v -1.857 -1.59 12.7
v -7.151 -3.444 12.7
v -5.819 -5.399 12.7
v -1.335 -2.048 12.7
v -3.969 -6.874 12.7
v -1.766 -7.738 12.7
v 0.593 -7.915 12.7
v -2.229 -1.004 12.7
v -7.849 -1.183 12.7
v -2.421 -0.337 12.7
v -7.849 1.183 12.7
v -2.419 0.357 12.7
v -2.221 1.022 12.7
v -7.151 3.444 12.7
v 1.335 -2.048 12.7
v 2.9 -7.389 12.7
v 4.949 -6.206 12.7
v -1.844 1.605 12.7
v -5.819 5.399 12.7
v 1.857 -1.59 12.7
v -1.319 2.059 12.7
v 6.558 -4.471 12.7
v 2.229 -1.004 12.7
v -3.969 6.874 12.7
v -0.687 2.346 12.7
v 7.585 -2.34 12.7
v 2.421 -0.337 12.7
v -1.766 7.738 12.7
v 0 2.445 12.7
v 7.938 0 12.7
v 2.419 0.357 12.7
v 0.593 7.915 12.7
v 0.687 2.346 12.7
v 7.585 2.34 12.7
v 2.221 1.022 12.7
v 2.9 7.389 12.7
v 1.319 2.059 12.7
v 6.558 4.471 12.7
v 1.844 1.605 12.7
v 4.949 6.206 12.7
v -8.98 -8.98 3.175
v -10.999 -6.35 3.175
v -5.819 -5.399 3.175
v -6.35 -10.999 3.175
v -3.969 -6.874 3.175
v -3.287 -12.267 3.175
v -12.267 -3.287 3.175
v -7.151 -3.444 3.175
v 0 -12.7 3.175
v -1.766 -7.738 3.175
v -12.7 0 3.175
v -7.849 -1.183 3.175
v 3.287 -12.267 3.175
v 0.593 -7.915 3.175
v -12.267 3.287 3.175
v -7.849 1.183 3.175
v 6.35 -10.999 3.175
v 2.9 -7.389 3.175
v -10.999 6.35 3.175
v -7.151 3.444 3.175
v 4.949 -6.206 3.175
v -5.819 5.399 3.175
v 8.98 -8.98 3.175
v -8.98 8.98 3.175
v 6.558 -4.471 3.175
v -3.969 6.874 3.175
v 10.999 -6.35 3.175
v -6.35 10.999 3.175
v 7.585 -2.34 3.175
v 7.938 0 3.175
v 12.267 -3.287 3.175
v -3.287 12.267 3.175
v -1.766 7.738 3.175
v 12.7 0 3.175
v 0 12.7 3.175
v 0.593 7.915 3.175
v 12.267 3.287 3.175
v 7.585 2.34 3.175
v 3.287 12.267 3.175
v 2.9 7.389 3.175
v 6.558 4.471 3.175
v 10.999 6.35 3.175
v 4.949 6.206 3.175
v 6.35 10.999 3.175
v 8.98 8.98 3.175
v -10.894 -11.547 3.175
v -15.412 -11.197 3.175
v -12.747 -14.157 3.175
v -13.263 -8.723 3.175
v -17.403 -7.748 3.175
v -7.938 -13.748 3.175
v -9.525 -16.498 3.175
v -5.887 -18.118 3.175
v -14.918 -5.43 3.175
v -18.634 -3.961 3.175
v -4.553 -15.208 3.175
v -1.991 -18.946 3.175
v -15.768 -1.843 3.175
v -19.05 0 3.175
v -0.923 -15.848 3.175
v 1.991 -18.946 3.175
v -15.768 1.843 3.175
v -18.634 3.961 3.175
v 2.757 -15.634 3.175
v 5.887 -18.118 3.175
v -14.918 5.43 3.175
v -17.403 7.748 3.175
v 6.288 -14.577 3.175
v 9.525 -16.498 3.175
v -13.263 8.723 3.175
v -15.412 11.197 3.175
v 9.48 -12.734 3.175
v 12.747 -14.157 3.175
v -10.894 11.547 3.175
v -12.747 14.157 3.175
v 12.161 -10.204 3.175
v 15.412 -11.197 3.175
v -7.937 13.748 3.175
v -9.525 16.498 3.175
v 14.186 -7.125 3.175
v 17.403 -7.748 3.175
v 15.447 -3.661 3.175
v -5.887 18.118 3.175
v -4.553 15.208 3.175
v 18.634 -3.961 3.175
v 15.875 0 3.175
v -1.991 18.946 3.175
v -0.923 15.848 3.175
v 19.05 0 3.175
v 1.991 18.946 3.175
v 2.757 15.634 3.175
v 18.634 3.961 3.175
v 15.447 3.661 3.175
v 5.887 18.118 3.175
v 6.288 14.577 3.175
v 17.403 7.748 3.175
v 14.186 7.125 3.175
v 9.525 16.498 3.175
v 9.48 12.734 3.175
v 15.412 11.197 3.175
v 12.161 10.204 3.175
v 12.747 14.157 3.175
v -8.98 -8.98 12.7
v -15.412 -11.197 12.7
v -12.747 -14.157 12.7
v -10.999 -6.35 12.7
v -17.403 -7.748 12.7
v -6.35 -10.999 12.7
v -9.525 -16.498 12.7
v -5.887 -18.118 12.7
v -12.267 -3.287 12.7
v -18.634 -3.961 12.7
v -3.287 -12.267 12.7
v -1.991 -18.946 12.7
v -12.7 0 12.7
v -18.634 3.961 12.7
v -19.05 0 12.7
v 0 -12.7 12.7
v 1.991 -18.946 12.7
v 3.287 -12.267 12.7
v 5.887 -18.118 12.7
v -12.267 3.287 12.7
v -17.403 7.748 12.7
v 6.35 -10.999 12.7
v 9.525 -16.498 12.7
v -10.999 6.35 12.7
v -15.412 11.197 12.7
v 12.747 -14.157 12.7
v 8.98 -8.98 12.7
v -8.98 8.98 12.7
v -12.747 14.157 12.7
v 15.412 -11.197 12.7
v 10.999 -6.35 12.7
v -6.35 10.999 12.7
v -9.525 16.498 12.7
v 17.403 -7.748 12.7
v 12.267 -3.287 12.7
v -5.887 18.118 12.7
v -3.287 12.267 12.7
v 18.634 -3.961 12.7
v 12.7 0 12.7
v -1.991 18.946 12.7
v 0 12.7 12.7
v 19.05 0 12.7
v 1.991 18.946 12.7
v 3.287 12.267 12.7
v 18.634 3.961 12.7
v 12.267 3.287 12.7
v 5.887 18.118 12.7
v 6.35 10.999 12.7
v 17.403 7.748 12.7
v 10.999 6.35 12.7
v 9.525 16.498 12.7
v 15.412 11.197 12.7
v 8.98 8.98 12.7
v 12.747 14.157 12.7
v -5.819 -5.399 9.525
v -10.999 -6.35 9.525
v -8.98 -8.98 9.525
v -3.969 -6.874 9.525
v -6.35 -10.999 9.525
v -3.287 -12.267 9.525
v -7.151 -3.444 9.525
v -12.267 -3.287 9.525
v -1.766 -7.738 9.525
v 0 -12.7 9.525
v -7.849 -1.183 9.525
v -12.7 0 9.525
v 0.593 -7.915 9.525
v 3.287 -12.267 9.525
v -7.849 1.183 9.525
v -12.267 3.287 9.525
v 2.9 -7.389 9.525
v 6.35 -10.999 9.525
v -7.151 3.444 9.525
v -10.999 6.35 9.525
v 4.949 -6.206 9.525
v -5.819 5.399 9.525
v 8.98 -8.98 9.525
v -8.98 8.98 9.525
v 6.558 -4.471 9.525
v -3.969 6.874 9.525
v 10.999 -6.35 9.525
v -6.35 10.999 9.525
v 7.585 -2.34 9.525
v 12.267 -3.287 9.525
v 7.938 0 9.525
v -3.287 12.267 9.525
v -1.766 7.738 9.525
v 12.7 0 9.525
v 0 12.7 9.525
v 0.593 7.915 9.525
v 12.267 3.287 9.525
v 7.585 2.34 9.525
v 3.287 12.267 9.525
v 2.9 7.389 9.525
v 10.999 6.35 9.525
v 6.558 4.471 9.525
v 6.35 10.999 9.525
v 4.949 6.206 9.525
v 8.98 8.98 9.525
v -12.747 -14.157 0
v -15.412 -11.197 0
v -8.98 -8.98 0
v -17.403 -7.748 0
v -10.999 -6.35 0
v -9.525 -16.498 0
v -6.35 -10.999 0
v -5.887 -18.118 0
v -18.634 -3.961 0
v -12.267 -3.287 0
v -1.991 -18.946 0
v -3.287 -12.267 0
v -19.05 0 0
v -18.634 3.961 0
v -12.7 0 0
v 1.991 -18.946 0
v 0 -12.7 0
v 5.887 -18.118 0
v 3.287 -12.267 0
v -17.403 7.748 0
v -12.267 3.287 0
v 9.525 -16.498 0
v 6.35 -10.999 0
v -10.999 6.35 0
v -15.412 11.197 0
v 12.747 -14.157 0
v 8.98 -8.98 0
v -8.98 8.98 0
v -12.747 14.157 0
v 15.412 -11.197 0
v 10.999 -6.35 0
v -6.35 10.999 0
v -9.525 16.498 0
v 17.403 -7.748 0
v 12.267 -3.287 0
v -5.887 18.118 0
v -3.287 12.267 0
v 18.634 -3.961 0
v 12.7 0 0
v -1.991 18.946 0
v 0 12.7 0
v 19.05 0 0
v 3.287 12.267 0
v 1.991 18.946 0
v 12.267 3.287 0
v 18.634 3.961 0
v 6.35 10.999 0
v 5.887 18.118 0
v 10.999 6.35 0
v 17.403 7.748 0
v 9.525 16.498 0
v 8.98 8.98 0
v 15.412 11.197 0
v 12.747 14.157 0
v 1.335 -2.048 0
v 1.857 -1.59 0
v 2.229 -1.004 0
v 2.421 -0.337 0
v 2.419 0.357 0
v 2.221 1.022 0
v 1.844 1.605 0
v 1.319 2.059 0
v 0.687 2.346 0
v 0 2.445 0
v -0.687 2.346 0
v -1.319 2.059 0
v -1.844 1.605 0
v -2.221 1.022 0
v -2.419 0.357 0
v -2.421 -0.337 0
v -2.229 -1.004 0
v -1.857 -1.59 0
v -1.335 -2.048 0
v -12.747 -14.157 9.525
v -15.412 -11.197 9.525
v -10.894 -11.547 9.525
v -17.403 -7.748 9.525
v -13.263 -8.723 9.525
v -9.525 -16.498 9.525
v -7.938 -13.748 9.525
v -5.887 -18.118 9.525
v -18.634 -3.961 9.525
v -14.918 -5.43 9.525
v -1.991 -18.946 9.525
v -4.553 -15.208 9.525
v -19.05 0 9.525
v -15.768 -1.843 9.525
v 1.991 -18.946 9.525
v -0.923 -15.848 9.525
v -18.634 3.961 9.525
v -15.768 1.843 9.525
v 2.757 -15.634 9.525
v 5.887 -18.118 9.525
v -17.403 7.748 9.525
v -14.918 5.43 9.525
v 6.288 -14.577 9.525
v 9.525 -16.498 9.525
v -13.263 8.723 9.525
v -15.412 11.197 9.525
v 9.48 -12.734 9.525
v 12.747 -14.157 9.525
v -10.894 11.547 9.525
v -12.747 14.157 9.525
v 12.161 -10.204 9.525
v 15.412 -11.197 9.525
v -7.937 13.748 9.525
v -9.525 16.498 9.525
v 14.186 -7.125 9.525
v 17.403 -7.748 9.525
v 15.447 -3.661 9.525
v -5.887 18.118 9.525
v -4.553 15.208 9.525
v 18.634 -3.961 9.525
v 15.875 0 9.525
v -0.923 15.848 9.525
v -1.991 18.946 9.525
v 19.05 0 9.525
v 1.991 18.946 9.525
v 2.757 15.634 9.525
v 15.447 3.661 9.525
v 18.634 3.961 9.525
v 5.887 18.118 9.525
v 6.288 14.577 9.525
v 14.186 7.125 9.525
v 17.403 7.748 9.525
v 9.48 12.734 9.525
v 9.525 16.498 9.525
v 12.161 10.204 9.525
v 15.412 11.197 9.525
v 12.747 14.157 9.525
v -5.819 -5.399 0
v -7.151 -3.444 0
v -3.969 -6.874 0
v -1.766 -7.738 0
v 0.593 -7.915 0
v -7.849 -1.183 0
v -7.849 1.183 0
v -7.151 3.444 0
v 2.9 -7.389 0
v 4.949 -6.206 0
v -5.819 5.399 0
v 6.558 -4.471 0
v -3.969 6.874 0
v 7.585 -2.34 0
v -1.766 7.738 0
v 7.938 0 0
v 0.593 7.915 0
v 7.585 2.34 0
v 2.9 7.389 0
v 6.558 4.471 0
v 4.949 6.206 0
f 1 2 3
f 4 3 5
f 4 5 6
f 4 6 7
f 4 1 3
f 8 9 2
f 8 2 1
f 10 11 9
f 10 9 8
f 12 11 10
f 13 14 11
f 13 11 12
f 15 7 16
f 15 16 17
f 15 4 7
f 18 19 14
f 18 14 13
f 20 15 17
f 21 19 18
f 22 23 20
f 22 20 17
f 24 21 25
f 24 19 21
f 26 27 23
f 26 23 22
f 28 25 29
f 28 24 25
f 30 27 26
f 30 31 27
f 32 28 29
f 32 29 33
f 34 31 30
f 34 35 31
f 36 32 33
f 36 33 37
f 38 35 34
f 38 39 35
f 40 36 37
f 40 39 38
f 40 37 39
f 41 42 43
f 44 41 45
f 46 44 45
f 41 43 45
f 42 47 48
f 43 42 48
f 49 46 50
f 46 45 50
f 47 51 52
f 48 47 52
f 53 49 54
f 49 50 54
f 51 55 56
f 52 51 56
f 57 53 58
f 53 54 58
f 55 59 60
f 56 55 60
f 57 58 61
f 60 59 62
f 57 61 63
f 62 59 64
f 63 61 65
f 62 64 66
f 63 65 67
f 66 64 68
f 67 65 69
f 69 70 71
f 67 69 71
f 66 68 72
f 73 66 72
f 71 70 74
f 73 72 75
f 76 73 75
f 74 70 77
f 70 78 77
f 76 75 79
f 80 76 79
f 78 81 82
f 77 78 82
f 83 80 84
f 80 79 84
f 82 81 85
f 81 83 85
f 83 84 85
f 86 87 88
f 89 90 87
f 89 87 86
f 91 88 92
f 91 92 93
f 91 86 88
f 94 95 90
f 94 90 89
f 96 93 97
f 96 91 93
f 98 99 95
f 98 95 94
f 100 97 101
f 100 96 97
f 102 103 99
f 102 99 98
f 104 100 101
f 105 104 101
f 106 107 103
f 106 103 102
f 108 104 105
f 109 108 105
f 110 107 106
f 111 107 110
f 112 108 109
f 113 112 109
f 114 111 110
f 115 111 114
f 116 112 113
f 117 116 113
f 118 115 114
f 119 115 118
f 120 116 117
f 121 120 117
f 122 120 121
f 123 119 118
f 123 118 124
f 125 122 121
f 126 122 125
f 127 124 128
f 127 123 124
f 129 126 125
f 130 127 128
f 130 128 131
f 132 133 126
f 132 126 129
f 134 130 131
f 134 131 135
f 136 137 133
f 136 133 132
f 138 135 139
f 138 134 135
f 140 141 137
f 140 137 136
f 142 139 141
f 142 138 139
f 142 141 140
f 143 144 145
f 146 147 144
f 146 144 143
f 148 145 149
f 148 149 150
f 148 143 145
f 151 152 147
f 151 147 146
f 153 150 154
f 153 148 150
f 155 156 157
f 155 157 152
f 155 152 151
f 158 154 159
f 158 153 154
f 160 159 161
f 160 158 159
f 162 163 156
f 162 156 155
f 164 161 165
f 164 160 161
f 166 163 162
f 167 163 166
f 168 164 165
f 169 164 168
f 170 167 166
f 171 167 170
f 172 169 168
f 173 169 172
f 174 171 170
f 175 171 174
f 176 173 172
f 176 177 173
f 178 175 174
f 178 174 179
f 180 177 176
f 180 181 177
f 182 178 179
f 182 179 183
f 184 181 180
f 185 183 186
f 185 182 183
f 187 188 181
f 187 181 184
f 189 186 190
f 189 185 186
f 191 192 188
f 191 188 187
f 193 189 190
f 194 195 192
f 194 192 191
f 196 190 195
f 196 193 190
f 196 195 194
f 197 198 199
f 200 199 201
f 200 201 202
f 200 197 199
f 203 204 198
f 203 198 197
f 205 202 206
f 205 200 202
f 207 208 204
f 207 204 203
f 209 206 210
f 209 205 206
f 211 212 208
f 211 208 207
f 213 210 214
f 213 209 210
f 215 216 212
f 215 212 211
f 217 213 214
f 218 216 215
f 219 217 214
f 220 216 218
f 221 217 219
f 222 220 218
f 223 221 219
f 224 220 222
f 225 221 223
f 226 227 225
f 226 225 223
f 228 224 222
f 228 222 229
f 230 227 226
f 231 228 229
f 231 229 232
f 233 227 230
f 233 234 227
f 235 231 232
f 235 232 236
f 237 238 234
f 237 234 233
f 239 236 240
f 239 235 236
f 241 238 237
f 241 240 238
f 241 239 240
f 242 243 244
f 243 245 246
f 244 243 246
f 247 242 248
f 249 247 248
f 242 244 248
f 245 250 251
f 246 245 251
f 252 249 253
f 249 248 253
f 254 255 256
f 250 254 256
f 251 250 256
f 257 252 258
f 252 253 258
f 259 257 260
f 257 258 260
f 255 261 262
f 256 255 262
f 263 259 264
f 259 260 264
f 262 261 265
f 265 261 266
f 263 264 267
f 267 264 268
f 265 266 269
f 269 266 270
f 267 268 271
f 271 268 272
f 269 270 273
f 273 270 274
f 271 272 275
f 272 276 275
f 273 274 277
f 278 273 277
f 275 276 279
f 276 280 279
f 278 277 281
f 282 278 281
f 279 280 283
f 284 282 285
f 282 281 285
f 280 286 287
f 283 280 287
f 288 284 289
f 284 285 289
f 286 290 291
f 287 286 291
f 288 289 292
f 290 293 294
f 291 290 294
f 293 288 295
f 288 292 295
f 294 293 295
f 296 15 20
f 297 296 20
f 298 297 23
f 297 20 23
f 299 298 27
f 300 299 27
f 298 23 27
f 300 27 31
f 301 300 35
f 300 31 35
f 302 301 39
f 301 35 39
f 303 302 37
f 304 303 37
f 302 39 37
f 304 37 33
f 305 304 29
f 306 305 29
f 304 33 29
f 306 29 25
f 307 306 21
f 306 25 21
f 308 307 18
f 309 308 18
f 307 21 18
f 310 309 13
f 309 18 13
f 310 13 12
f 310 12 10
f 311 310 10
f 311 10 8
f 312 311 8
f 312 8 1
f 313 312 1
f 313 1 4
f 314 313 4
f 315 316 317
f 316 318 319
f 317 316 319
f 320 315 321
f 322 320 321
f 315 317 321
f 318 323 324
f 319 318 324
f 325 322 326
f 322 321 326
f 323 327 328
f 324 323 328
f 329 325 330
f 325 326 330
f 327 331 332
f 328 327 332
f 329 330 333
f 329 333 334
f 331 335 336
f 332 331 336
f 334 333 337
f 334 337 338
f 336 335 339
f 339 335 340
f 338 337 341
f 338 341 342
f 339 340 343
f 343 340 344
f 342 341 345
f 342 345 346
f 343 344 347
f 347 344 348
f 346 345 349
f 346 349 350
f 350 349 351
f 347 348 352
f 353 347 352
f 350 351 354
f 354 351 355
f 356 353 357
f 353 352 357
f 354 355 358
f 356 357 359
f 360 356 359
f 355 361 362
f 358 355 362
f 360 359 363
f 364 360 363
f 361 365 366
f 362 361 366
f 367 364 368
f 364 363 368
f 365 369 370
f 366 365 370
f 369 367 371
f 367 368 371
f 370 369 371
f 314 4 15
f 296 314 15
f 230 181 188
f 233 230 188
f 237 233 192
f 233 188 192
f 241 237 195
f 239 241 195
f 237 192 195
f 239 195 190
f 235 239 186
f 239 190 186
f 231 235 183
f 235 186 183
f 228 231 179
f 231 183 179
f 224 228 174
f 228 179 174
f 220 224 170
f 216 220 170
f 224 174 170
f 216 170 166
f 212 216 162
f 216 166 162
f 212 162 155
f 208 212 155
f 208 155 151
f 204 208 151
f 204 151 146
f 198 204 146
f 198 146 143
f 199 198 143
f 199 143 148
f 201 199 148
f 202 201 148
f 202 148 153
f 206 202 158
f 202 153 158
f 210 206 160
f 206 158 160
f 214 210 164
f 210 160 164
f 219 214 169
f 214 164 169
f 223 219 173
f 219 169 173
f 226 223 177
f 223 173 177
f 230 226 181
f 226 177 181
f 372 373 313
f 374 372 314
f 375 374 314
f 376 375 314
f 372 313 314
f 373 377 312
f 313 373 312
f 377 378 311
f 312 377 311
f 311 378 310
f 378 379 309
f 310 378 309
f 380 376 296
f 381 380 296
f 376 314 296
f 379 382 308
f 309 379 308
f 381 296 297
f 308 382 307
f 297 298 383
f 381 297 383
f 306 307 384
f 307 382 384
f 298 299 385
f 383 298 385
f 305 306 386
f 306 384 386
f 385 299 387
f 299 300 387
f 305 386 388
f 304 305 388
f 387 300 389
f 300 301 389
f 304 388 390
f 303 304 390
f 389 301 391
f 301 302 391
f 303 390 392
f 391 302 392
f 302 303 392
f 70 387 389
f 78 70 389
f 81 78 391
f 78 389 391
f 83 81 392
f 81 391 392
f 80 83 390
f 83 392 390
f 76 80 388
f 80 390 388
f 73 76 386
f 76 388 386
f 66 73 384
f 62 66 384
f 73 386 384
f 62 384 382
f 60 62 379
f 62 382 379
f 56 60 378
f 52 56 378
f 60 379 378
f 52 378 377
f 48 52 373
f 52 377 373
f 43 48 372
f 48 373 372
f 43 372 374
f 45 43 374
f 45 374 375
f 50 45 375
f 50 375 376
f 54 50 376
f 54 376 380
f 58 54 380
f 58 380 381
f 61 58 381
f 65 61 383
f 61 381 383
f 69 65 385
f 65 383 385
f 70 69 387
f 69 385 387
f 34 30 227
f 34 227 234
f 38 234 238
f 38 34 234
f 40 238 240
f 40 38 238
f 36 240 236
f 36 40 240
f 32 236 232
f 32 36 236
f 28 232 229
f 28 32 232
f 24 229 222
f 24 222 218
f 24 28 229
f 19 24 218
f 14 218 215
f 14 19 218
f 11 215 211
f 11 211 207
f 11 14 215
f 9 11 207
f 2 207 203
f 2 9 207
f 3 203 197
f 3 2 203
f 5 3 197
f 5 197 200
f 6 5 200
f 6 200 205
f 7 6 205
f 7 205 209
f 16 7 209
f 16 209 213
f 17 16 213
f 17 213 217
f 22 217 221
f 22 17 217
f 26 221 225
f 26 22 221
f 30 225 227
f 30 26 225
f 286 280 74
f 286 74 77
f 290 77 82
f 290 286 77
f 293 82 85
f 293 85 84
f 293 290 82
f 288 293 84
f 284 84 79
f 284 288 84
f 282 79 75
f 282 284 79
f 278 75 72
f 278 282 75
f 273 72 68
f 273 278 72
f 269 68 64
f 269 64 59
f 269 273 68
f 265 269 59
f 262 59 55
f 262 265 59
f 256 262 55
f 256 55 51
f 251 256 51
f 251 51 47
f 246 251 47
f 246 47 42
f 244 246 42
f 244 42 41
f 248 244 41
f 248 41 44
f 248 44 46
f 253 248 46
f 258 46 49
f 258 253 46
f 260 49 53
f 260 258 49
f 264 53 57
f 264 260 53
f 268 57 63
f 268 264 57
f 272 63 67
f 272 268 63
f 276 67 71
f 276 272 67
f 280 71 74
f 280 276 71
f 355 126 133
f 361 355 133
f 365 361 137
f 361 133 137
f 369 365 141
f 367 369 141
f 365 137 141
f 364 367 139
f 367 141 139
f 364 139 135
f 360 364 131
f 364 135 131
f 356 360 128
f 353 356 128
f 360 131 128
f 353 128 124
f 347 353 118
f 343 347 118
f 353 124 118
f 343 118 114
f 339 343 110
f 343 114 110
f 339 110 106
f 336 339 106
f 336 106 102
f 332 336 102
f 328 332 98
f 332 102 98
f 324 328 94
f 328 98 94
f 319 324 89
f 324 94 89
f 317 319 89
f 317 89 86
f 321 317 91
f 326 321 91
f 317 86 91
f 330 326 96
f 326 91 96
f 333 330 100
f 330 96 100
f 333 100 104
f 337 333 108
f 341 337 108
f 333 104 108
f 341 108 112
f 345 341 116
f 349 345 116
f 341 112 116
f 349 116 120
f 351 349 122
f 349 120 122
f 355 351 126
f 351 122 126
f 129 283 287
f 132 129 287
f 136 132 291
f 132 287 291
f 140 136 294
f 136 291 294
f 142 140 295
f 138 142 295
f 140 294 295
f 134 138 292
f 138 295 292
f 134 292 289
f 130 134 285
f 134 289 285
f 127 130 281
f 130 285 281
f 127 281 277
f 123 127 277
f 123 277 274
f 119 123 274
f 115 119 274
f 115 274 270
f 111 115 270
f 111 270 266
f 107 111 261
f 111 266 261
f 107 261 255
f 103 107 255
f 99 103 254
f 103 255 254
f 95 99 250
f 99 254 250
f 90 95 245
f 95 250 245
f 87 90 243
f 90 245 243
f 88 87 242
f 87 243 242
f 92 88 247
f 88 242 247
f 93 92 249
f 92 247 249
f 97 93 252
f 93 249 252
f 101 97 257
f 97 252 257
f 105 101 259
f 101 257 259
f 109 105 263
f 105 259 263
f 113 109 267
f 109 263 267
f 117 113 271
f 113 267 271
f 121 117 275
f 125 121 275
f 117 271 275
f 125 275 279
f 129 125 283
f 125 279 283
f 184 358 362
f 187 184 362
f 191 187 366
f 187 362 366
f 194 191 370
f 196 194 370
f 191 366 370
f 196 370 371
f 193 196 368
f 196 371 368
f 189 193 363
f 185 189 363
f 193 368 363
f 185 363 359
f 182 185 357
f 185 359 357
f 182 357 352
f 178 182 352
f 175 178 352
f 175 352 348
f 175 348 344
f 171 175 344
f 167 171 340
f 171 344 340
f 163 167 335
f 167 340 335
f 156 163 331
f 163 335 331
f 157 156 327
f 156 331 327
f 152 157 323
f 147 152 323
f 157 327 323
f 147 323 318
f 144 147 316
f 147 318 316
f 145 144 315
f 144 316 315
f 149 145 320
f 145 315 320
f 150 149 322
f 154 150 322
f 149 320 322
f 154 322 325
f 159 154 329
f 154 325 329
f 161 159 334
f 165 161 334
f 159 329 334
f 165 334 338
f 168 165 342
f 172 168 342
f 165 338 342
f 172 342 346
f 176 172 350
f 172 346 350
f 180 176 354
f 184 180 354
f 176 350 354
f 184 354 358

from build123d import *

# Parameters (mm, degrees)
F0_R      = 19.05
F1_DEPTH  = 3.175
F2_R      = 15.875
F3_DEPTH  = 6.35
F4_R      = 19.05
F5_DEPTH  = 3.175
F6_R      = 12.7
F6_R_2    = 7.9375
F7_DEPTH  = 3.175
F10_DEPTH = 12.7


# Not quite as in the source:
# - a pattern or mirror of a feature is missing from the dataset's text; its kind, count and spacing are read off the source's solid


with BuildPart() as f1:
    # F0 (on Top) → F1 (new body)
    with BuildSketch(Plane.XY):
        Circle(F0_R)
    extrude(amount=F1_DEPTH)

    # F2 (on face) → F3 (join)
    with BuildSketch(Plane.XY.offset(3.175)):
        Circle(F2_R)
    extrude(amount=F3_DEPTH)

    # F4 (on face) → F5 (join)
    with BuildSketch(Plane.XY.offset(9.525)):
        Circle(F4_R)
    extrude(amount=F5_DEPTH)

    # F6 (on face) → F7 (cut)
    with BuildSketch(Plane.XY.offset(12.7)):
        Circle(F6_R)
        Circle(F6_R_2, mode=Mode.SUBTRACT)
    f7 = extrude(amount=-F7_DEPTH, mode=Mode.SUBTRACT)

    # F7_copies: F7 across plane
    add(f7.mirror(Plane(origin=(0, 0, 6.35), x_dir=(-1, 0, 0), z_dir=(0, 0, -1))), mode=Mode.SUBTRACT)

    # F9 (on face) → F10 (cut, through all)
    with BuildSketch(Plane.XY.offset(12.7)):
        with BuildLine():
            Line((-1.3352941799, -2.047875), (1.3352941799, -2.047875))
            ThreePointArc((1.3352941799, -2.047875), (0, 2.44475), (-1.3352941799, -2.047875))
        make_face()
    extrude(amount=-F10_DEPTH, mode=Mode.SUBTRACT)


solid = f1.part
